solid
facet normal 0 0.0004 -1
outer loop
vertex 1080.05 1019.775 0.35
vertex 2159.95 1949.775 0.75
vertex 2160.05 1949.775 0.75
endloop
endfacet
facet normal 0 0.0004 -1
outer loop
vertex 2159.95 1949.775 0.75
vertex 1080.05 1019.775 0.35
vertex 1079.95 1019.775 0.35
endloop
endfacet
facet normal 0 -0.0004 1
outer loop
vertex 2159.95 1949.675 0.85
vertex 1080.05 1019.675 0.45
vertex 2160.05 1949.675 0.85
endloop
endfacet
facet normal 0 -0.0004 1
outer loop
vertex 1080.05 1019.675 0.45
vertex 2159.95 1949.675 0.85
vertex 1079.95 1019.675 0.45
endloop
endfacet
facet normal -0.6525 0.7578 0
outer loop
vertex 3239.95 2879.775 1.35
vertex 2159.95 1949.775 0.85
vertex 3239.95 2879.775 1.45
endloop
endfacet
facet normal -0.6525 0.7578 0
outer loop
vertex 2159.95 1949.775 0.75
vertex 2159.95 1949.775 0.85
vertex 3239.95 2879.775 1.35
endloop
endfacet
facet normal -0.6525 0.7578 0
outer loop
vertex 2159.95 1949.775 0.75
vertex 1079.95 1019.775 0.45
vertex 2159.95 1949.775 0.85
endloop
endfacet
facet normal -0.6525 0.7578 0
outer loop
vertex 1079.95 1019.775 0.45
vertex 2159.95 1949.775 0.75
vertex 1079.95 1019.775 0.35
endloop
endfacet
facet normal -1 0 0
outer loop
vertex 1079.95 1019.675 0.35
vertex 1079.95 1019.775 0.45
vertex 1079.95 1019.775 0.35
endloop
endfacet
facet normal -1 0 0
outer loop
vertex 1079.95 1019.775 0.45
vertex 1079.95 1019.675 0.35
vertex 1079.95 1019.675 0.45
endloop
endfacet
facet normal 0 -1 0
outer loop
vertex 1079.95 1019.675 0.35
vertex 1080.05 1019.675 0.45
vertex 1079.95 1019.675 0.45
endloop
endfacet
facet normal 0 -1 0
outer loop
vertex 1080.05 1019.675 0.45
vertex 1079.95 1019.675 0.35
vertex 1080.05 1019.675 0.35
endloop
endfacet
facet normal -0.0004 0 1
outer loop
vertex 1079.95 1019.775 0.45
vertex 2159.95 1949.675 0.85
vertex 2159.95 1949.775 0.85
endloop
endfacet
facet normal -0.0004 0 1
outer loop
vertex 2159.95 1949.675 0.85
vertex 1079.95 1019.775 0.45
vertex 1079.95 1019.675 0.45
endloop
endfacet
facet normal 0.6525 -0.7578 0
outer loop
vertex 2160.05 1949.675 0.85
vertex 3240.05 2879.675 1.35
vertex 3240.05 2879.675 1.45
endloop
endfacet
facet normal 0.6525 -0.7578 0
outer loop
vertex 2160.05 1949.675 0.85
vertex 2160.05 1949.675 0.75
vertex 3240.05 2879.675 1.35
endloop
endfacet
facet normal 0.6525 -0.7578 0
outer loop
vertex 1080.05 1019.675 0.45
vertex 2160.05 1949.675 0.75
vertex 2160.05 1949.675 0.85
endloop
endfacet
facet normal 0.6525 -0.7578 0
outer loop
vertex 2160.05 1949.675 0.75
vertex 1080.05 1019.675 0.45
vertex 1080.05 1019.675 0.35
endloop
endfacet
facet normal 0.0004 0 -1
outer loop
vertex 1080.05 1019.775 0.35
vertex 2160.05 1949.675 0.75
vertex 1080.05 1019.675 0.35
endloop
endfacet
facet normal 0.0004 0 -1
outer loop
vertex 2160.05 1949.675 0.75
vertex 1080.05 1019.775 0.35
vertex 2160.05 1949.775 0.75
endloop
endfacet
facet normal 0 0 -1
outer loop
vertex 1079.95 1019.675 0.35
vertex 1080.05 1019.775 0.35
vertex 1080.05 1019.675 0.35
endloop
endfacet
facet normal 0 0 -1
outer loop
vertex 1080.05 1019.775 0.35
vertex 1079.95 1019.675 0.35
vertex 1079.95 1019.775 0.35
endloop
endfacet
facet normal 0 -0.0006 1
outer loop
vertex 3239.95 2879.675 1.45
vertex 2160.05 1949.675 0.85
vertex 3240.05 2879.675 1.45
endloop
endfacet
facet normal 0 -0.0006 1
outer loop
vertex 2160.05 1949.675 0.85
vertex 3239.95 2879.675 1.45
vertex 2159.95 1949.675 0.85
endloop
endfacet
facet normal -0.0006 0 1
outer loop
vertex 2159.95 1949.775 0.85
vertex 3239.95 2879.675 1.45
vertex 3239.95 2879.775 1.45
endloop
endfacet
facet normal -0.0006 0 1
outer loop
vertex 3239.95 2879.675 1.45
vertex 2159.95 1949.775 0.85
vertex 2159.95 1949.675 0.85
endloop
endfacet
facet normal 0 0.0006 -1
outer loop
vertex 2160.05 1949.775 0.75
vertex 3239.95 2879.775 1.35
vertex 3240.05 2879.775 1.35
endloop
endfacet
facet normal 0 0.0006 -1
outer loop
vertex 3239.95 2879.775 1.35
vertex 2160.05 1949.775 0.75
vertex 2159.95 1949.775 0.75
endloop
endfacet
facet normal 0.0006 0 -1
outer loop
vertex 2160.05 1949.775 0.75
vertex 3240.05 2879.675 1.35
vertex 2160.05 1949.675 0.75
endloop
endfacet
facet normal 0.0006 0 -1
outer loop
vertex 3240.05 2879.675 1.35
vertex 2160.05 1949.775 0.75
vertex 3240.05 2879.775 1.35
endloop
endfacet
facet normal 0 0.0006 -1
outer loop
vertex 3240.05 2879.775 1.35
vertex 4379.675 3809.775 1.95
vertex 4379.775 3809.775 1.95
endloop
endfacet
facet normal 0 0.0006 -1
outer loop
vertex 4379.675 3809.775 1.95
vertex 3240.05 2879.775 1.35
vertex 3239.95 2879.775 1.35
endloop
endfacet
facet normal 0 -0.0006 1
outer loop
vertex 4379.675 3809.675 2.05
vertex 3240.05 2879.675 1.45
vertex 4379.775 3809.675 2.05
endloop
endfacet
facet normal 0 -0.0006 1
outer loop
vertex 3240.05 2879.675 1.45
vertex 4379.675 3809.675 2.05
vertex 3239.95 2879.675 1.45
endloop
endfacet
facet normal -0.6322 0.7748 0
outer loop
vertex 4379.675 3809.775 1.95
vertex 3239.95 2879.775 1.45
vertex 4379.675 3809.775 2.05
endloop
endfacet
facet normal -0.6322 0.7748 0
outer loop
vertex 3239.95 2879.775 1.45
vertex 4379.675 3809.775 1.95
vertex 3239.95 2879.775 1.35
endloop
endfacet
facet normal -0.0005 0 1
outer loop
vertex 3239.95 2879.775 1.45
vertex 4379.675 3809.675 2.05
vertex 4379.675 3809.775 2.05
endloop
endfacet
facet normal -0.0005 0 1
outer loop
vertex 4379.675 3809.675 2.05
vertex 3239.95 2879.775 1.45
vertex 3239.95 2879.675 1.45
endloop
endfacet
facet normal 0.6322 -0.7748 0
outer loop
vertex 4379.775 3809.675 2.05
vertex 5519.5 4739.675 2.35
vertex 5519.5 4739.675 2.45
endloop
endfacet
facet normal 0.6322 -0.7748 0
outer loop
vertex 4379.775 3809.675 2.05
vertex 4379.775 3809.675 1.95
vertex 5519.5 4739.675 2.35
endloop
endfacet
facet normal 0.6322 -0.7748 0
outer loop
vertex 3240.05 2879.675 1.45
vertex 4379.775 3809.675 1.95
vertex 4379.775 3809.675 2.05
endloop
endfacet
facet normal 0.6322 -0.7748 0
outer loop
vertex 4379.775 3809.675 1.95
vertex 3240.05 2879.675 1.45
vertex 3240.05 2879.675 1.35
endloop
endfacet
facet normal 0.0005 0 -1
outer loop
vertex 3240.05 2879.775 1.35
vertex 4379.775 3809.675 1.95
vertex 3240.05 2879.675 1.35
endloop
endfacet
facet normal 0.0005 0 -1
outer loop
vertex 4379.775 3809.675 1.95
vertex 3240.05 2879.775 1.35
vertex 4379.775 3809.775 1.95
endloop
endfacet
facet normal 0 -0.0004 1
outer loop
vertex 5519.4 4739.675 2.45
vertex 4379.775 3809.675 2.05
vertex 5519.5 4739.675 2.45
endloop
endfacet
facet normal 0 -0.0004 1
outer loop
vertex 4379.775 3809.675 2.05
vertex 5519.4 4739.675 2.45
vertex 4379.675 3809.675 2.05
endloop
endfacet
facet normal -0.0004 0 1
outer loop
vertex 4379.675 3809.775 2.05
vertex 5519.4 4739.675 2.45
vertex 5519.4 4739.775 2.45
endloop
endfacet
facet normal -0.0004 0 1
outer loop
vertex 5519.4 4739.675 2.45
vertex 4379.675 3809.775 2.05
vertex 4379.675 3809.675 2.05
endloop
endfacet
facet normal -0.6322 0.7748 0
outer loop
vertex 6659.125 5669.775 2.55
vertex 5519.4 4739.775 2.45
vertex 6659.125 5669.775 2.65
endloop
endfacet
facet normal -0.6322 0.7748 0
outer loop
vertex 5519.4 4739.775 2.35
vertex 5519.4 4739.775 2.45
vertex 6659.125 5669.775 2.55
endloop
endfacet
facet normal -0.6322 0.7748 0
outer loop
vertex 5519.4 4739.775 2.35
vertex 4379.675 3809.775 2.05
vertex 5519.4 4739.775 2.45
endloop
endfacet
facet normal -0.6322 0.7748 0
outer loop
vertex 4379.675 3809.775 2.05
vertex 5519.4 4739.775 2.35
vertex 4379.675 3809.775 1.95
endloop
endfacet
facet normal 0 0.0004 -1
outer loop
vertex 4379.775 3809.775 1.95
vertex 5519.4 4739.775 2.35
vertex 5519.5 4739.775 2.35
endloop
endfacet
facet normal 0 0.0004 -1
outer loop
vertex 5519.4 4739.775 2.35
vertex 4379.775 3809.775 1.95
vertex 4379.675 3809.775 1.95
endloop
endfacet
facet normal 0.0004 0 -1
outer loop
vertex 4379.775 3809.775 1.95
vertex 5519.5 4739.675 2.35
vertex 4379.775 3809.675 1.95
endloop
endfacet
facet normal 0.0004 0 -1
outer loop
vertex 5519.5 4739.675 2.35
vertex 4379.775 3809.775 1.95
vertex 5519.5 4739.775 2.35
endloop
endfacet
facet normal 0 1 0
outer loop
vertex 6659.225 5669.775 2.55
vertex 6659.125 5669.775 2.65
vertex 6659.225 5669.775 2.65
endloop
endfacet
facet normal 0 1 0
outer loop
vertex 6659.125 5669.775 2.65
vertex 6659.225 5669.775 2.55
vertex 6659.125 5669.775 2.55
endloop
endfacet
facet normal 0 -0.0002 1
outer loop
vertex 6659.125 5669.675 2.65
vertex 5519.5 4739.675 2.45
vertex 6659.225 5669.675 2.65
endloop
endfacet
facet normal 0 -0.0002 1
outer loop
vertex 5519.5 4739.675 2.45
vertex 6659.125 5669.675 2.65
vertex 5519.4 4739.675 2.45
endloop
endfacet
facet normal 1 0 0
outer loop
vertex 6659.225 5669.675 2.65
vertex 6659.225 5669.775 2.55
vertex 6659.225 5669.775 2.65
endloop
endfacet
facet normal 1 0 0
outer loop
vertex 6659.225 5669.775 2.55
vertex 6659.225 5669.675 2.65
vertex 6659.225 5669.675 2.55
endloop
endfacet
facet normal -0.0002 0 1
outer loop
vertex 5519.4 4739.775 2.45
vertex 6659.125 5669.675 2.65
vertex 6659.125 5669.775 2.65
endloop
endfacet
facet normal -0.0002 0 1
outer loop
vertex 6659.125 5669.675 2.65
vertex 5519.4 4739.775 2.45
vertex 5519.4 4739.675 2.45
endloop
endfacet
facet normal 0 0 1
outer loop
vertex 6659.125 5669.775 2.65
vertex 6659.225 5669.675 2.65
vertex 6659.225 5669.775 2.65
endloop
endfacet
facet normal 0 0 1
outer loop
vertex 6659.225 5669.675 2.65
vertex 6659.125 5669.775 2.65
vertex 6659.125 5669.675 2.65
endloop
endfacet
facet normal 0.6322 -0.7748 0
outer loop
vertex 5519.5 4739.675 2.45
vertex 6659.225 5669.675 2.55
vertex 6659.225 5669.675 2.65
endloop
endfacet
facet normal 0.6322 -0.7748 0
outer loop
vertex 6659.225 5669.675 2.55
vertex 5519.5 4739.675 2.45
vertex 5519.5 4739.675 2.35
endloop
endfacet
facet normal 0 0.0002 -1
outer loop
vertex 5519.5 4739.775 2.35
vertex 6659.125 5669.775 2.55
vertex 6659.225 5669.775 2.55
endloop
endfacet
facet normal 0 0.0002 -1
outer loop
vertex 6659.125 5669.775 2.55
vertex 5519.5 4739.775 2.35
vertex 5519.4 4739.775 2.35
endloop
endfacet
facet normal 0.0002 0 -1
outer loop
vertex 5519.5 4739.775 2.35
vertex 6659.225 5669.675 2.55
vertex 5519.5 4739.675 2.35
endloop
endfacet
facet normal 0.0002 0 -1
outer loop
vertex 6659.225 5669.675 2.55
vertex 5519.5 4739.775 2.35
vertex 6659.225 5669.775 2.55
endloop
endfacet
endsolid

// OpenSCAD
use <./../support_libs/polychannel_v2.scad>

polychannel_route("connect10", 
            ["serp10", "out_fluid"], ["mix0", "b_fluid"],
            [["cube", [0.1, 0.1, 0.1], [1080.0, 1019.725, 0.4], [0, [0, 0, 1]]],
 ["cube", [0.1, 0.1, 0.1], [1080.0, 930.0, 0.4], [0, [0, 0, 1]]],
 ["cube", [0.1, 0.1, 0.1], [1080.0, 930.0, 0.6], [0, [0, 0, 1]]],
 ["cube", [0.1, 0.1, 0.1], [1139.725, 930.0, 0.6], [0, [0, 0, 1]]],
 ["cube", [0.1, 0.1, 0.1], [1139.725, 930.0, 0.4], [0, [0, 0, 1]]],
 ["cube", [0.1, 0.1, 0.1], [1139.725, 930.0, 0.2], [0, [0, 0, 1]]]]
);

/*
polychannel([["cube", [0.4, 0.4, 0.4], [1080.0, 1019.725, 0.4], [0, [0, 0, 1]]],
 ["cube", [0.1, 0.1, 0.1], [1080.0, 930.0, 0.4], [0, [0, 0, 1]]],
 ["cube", [0.1, 0.1, 0.1], [1080.0, 930.0, 0.6], [0, [0, 0, 1]]],
 ["cube", [0.1, 0.1, 0.1], [1139.725, 930.0, 0.6], [0, [0, 0, 1]]],
 ["cube", [0.1, 0.1, 0.1], [1139.725, 930.0, 0.4], [0, [0, 0, 1]]],
 ["cube", [0.1, 0.1, 0.1], [1139.725, 930.0, 0.2], [0, [0, 0, 1]]]]);
 */
